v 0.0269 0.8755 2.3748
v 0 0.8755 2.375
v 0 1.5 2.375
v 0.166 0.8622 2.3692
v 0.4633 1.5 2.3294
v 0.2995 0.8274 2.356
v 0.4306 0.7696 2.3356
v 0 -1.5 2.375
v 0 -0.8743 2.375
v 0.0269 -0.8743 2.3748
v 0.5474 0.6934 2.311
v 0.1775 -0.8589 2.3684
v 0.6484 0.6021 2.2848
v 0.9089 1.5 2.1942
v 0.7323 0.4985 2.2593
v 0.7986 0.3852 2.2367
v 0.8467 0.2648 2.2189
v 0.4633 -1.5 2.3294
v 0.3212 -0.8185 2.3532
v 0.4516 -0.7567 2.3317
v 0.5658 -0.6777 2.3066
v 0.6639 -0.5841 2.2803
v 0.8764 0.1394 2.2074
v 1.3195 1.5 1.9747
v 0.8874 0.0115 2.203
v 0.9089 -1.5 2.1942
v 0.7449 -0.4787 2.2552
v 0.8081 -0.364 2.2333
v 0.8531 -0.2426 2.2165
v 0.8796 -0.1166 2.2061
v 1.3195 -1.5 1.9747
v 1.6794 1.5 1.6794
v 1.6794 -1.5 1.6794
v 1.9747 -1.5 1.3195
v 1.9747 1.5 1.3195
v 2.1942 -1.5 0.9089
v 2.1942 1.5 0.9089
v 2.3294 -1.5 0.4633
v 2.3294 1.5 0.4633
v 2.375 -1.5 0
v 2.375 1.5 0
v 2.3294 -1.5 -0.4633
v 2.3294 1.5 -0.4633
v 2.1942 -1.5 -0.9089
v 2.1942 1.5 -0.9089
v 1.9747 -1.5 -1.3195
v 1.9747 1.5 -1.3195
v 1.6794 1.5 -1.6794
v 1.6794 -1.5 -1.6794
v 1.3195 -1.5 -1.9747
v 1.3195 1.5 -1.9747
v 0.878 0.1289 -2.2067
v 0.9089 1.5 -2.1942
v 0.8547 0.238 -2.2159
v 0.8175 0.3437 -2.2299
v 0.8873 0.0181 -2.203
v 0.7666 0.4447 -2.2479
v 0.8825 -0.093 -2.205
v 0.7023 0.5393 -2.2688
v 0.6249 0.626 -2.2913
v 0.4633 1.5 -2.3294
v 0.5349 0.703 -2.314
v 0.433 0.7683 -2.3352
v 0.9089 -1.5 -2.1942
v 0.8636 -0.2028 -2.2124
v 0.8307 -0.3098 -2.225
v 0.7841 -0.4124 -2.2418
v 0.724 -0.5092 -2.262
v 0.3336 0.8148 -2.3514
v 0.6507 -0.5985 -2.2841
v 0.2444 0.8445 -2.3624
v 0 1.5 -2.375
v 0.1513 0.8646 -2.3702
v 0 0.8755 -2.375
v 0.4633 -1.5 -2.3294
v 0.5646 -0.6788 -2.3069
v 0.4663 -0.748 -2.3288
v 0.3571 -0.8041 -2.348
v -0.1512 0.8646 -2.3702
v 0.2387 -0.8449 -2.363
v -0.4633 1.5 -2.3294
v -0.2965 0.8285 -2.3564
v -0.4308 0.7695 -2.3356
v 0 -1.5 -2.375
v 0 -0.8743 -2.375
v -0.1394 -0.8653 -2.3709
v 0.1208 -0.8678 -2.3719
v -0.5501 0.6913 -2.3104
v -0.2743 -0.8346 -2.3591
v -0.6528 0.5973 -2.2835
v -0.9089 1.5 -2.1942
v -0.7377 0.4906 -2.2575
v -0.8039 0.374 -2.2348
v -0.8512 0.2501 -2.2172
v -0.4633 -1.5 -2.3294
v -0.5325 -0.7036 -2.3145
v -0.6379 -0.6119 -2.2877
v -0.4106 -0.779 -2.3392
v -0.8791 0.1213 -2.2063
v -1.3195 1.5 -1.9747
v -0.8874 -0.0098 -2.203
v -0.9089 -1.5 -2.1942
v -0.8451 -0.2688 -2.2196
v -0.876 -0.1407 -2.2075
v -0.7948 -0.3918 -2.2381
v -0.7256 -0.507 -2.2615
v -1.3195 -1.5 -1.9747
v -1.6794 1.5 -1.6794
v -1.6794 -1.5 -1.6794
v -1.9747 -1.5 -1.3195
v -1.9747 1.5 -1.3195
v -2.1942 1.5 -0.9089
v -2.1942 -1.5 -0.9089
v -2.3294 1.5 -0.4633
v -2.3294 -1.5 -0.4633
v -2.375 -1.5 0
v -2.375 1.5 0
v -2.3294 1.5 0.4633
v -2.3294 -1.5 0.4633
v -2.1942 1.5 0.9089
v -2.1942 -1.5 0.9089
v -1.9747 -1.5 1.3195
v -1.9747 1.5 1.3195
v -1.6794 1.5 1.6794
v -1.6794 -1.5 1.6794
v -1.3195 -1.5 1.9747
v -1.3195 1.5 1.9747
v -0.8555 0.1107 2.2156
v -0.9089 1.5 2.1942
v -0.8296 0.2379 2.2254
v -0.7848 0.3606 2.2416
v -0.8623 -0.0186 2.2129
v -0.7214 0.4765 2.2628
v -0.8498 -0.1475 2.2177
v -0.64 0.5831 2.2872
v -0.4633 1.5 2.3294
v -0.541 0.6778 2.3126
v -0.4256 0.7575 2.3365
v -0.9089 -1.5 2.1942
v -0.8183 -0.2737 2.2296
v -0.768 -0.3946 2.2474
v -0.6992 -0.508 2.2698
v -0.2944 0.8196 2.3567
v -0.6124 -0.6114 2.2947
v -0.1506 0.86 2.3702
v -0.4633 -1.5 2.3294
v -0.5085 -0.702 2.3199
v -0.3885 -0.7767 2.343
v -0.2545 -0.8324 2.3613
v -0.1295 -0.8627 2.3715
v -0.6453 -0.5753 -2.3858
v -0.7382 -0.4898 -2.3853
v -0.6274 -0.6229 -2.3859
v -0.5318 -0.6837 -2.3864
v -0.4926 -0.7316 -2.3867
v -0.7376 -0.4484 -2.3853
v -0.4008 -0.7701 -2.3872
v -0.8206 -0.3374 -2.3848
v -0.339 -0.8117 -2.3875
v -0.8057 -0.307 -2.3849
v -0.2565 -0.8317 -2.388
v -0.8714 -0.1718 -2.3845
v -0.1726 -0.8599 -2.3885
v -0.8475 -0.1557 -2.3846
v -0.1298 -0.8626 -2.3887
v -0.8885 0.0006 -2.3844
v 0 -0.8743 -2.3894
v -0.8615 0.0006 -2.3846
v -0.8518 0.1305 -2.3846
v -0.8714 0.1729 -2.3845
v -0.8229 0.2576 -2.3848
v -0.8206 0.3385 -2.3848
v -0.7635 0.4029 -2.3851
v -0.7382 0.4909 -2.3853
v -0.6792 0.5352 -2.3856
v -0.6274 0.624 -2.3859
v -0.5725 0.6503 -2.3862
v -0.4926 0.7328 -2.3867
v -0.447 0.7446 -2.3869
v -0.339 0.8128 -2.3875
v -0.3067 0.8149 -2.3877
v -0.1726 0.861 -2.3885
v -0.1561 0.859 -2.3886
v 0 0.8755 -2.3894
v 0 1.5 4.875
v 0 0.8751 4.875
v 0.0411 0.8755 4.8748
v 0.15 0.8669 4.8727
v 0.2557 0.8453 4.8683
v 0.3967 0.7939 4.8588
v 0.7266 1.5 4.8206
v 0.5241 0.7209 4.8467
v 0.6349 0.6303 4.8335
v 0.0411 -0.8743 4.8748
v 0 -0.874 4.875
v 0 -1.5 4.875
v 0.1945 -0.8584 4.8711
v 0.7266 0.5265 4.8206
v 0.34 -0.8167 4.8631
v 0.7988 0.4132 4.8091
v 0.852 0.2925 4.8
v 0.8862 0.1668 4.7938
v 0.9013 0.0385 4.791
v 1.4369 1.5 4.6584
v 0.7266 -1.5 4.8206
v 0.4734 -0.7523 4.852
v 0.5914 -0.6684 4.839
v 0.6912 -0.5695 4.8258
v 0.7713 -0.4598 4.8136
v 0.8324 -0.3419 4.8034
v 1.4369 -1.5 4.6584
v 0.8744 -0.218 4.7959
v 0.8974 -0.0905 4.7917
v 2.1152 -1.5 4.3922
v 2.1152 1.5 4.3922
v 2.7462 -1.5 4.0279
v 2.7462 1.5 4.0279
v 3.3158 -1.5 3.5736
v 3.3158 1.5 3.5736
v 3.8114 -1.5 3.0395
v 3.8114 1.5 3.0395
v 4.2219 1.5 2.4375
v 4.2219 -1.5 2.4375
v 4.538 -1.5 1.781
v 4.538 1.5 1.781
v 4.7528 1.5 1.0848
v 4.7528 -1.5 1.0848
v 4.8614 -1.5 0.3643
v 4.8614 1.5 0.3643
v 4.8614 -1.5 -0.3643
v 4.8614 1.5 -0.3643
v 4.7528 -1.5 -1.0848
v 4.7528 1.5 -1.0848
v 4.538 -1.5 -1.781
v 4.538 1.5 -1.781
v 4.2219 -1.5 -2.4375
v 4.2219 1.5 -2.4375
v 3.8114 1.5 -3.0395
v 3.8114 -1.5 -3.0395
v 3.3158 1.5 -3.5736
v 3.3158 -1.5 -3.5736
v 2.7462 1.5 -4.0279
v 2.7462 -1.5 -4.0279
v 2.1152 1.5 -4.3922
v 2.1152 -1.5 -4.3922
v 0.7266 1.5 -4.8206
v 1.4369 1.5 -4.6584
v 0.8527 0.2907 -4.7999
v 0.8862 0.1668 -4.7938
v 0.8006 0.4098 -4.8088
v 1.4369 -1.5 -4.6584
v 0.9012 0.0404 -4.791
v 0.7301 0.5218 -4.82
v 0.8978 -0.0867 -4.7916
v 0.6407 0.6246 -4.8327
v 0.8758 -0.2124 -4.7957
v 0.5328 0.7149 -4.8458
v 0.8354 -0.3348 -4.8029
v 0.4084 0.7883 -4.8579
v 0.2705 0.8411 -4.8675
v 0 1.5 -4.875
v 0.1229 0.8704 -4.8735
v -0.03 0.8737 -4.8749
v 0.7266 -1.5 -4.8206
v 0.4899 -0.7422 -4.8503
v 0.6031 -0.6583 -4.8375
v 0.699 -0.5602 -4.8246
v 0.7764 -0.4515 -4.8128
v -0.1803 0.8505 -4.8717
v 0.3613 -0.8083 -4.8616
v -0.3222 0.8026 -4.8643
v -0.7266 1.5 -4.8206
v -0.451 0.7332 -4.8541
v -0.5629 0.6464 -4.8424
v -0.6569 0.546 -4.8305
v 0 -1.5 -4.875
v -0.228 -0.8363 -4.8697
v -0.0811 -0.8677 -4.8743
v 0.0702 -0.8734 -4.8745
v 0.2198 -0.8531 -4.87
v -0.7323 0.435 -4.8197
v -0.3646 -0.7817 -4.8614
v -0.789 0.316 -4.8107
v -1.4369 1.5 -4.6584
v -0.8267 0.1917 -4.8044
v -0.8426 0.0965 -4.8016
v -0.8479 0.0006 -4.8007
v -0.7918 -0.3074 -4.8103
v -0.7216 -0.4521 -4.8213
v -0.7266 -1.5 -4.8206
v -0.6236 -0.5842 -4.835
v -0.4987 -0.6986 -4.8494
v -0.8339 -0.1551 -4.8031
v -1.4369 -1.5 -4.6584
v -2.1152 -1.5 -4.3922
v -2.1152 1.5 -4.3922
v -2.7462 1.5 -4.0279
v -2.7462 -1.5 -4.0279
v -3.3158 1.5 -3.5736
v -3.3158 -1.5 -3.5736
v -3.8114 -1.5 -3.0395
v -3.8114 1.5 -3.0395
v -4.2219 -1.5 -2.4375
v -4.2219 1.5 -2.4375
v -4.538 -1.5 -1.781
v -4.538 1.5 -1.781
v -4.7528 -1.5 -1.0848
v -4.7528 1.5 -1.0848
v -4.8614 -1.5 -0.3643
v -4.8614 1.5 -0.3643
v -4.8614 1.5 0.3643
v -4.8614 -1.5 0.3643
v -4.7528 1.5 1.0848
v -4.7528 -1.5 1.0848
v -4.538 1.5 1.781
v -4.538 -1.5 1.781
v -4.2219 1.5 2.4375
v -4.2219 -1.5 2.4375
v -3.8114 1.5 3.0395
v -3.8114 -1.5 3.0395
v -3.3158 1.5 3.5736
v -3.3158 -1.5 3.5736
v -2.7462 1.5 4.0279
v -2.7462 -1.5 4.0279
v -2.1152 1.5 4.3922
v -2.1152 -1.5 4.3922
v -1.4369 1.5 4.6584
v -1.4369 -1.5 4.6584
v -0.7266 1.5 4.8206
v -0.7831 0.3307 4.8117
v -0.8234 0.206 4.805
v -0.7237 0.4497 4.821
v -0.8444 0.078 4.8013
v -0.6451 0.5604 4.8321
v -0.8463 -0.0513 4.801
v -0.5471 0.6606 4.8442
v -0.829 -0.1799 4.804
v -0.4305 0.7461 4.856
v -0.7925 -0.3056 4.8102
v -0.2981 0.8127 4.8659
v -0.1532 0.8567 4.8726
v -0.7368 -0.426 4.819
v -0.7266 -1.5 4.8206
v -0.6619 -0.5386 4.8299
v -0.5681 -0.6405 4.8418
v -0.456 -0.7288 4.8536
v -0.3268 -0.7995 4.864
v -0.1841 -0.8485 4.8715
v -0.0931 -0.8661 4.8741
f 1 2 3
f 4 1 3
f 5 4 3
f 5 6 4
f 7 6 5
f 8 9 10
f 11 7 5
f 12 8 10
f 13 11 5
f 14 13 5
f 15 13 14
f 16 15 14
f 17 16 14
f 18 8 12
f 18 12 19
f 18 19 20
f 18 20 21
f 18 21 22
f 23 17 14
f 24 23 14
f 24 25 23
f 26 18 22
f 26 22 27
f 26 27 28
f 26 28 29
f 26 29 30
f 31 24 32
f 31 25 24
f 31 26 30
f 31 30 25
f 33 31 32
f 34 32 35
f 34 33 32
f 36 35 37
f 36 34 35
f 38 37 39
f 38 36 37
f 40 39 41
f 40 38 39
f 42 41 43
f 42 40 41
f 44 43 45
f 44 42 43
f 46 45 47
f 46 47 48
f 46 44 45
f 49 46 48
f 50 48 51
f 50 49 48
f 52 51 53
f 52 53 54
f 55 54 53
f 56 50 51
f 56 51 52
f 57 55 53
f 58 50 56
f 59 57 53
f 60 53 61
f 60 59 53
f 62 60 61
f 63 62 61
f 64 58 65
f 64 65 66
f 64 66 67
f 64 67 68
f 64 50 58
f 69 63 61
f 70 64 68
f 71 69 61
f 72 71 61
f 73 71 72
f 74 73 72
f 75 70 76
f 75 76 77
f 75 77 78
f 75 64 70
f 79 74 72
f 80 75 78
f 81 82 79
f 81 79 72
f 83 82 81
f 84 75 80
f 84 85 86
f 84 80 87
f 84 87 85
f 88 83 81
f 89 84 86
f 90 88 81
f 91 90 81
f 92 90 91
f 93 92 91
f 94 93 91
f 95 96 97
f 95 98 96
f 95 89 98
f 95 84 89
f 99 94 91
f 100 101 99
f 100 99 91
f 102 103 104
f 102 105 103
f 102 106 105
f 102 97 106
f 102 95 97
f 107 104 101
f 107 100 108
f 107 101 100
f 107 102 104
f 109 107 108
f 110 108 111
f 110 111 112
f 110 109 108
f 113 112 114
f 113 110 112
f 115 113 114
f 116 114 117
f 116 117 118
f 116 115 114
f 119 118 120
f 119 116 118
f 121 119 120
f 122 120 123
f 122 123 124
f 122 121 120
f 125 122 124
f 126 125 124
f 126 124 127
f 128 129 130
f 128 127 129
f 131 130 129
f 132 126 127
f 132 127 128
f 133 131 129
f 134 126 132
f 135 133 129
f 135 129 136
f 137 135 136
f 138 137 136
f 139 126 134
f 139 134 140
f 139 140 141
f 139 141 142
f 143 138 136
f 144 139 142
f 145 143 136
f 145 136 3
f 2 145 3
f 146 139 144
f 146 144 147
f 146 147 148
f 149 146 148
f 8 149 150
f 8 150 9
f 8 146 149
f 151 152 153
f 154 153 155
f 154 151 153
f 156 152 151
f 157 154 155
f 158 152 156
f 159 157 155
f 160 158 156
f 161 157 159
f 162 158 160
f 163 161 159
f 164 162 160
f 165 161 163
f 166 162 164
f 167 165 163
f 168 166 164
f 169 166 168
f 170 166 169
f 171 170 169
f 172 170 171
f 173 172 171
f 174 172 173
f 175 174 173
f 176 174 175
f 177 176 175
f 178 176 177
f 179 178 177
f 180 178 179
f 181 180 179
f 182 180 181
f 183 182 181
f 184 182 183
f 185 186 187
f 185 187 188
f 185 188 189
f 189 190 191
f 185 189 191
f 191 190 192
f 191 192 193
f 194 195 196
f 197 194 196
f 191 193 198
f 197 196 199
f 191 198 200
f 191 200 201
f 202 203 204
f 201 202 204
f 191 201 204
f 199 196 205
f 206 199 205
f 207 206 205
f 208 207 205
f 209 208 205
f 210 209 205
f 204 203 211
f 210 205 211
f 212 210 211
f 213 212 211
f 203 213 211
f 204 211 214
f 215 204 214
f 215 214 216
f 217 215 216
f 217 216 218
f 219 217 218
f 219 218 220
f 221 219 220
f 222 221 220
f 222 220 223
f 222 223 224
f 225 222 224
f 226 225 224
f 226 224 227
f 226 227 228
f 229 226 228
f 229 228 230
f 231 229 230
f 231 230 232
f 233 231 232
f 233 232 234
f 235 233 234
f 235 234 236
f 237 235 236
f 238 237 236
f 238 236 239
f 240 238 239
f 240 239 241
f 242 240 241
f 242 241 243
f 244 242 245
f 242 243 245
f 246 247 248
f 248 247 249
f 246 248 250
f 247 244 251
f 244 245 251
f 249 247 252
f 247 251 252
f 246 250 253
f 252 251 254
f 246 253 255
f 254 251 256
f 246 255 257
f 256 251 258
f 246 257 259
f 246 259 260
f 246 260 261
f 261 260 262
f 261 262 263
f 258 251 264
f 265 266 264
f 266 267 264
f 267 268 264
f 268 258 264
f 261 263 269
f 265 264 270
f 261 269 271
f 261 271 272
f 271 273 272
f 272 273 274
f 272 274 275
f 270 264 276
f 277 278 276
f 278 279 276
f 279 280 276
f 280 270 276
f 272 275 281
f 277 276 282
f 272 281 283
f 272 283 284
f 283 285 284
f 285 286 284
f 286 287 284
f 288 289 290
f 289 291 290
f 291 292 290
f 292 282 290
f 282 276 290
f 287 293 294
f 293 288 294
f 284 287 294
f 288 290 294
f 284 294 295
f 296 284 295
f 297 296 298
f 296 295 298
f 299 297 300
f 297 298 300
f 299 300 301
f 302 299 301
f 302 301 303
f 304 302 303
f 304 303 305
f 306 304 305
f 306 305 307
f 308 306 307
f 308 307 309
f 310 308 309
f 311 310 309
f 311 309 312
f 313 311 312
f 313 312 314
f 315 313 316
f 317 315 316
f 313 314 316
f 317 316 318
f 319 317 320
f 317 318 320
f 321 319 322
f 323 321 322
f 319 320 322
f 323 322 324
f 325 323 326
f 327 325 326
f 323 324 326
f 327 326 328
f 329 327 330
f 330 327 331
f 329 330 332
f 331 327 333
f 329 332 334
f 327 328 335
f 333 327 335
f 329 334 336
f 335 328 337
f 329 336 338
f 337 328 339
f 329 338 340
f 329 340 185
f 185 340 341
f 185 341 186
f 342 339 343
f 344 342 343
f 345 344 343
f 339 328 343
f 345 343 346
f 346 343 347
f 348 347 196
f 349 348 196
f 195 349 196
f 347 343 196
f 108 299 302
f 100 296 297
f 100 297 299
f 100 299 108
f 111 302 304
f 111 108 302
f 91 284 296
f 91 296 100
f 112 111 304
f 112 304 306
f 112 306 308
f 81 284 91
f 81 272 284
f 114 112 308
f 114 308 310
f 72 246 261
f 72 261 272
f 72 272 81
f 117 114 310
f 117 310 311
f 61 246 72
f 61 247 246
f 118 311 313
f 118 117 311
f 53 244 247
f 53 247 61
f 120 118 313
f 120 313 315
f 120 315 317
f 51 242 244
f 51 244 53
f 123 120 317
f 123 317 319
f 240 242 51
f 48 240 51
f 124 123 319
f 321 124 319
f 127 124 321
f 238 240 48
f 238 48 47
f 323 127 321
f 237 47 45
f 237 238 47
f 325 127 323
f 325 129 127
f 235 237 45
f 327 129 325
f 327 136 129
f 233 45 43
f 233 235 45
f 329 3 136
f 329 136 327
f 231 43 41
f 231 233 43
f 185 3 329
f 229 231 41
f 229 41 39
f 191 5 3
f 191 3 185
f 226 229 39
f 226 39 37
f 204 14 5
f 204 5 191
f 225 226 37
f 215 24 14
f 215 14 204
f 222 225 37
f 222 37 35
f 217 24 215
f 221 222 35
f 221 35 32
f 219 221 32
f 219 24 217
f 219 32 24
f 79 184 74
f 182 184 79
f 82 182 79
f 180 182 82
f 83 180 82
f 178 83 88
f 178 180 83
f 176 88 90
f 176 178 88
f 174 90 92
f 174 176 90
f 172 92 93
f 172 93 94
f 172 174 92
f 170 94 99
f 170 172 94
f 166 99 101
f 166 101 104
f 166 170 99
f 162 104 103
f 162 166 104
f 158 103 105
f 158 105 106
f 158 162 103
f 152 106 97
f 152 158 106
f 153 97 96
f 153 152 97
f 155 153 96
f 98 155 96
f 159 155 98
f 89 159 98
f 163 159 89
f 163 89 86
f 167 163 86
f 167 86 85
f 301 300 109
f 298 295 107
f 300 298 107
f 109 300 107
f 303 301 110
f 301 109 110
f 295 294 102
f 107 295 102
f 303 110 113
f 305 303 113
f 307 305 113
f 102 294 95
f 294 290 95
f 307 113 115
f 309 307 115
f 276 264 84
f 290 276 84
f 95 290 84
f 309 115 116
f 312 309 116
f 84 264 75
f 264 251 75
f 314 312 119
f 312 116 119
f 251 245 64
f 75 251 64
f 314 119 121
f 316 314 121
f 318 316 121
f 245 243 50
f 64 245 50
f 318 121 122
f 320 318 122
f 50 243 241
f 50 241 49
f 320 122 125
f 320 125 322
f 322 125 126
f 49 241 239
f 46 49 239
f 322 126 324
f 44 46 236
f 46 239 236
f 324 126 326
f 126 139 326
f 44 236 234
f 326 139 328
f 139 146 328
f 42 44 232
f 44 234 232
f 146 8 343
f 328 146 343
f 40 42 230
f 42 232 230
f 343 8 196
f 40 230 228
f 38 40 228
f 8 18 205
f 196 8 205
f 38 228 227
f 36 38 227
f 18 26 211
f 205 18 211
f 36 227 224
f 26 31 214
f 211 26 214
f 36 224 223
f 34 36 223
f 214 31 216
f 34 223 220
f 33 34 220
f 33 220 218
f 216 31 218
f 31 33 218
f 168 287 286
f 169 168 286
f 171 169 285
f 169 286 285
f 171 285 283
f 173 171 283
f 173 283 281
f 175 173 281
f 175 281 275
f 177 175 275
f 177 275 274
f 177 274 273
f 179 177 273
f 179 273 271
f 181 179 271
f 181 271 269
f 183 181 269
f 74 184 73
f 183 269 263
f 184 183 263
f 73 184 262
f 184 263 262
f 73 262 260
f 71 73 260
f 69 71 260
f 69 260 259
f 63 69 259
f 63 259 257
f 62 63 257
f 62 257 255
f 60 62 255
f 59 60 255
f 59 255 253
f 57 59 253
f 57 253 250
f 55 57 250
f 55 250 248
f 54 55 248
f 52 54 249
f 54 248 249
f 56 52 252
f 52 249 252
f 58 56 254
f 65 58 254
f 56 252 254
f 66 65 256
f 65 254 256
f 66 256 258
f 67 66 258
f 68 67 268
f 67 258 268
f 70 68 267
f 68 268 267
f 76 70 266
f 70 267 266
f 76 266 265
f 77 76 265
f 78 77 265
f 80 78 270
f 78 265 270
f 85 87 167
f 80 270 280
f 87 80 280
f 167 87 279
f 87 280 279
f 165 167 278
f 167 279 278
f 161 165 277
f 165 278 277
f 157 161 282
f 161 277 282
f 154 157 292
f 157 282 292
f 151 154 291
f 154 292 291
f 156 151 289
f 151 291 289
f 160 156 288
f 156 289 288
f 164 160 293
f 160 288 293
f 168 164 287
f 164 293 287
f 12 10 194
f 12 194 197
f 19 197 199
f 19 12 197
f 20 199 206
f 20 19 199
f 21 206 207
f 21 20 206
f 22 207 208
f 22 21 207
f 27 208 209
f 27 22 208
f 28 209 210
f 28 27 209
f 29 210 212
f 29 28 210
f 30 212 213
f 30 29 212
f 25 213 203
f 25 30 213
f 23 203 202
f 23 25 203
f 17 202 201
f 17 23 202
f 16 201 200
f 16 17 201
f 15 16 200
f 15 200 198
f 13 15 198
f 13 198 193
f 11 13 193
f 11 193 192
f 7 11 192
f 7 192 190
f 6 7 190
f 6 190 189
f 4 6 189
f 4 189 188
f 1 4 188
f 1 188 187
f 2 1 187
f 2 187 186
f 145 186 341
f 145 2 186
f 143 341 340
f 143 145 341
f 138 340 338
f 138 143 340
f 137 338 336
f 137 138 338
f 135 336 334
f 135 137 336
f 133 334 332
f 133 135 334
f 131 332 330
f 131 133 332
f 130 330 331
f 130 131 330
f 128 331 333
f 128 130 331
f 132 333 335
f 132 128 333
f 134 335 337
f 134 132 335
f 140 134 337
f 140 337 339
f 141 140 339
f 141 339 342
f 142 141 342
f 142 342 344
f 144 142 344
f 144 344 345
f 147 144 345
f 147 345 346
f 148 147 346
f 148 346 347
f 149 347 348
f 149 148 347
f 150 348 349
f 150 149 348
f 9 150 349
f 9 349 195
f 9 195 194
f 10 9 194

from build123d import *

# Parameters (mm, degrees)
BOSS_EXTRUDE1_DEPTH         = 1.5
BOSS_EXTRUDE1_DEPTH_BACK    = 1.5
HOLDER_RING_R               = 4.875
HOLDER_RING_R_2             = 2.375
M2X0_25_TAPPED_HOLE1_REACH  = 13.016
M2X0_25_TAPPED_HOLE1_BORE_R = 0.875
MIRROR1_START               = -2.389401654
MIRROR1_DEPTH               = 7.264401636


# Read off the part's stored shape, not the designer's step: Mirror1
with BuildPart() as part:
    # holder_ring → Boss-Extrude1 (new, two sides: drawn at the far end of the back side and taken through both)
    with BuildSketch(Plane(origin=(0, 0, 0), x_dir=(1, 0, 0), z_dir=(0, 1, 0)).offset(-BOSS_EXTRUDE1_DEPTH_BACK)):
        with Locations(Location((0, 0, 0), (0, 0, 270))):
            Circle(HOLDER_RING_R)
        with Locations(Location((0, 0, 0), (0, 0, 270))):
            Circle(HOLDER_RING_R_2, mode=Mode.SUBTRACT)
    extrude(amount=BOSS_EXTRUDE1_DEPTH + BOSS_EXTRUDE1_DEPTH_BACK)

    # M2x0.25 Tapped Hole1 bore (on position points) → M2x0.25 Tapped Hole1 (cut, up to next)
    with BuildSketch(Plane(origin=(0.02757507, 0.000556894, -4.874922011), x_dir=(-0.999984002302, 0, -0.005656424646), z_dir=(0.005656424646, 0, -0.999984002302)), mode=Mode.PRIVATE) as m2x0_25_tapped_hole1_sk1:
        Circle(M2X0_25_TAPPED_HOLE1_BORE_R)
    m2x0_25_tapped_hole1_tool1 = extrude(m2x0_25_tapped_hole1_sk1.sketch, amount=-M2X0_25_TAPPED_HOLE1_REACH, mode=Mode.PRIVATE) & part.part
    add(m2x0_25_tapped_hole1_tool1.solids().sort_by_distance((0.027575, 0.000557, -4.874922))[0], mode=Mode.SUBTRACT)

    # Mirror1 outline → Mirror1 (cut)
    with BuildSketch(Plane(origin=(0, 0, 0), x_dir=(0.99998400230215, 0, -0.00565642464579779), z_dir=(0.00565642464579779, 0, 0.99998400230215)).offset(MIRROR1_START)):
        with BuildLine():
            ThreePointArc((0.013515687, -0.874338715), (0.875, 0.000556894), (0.013515687, 0.875452503))
            ThreePointArc((0.013515687, 0.875452503), (-0.875, 0.000556894), (0.013515687, -0.874338715))
        make_face()
    extrude(amount=MIRROR1_DEPTH, mode=Mode.SUBTRACT)


solid = part.part
